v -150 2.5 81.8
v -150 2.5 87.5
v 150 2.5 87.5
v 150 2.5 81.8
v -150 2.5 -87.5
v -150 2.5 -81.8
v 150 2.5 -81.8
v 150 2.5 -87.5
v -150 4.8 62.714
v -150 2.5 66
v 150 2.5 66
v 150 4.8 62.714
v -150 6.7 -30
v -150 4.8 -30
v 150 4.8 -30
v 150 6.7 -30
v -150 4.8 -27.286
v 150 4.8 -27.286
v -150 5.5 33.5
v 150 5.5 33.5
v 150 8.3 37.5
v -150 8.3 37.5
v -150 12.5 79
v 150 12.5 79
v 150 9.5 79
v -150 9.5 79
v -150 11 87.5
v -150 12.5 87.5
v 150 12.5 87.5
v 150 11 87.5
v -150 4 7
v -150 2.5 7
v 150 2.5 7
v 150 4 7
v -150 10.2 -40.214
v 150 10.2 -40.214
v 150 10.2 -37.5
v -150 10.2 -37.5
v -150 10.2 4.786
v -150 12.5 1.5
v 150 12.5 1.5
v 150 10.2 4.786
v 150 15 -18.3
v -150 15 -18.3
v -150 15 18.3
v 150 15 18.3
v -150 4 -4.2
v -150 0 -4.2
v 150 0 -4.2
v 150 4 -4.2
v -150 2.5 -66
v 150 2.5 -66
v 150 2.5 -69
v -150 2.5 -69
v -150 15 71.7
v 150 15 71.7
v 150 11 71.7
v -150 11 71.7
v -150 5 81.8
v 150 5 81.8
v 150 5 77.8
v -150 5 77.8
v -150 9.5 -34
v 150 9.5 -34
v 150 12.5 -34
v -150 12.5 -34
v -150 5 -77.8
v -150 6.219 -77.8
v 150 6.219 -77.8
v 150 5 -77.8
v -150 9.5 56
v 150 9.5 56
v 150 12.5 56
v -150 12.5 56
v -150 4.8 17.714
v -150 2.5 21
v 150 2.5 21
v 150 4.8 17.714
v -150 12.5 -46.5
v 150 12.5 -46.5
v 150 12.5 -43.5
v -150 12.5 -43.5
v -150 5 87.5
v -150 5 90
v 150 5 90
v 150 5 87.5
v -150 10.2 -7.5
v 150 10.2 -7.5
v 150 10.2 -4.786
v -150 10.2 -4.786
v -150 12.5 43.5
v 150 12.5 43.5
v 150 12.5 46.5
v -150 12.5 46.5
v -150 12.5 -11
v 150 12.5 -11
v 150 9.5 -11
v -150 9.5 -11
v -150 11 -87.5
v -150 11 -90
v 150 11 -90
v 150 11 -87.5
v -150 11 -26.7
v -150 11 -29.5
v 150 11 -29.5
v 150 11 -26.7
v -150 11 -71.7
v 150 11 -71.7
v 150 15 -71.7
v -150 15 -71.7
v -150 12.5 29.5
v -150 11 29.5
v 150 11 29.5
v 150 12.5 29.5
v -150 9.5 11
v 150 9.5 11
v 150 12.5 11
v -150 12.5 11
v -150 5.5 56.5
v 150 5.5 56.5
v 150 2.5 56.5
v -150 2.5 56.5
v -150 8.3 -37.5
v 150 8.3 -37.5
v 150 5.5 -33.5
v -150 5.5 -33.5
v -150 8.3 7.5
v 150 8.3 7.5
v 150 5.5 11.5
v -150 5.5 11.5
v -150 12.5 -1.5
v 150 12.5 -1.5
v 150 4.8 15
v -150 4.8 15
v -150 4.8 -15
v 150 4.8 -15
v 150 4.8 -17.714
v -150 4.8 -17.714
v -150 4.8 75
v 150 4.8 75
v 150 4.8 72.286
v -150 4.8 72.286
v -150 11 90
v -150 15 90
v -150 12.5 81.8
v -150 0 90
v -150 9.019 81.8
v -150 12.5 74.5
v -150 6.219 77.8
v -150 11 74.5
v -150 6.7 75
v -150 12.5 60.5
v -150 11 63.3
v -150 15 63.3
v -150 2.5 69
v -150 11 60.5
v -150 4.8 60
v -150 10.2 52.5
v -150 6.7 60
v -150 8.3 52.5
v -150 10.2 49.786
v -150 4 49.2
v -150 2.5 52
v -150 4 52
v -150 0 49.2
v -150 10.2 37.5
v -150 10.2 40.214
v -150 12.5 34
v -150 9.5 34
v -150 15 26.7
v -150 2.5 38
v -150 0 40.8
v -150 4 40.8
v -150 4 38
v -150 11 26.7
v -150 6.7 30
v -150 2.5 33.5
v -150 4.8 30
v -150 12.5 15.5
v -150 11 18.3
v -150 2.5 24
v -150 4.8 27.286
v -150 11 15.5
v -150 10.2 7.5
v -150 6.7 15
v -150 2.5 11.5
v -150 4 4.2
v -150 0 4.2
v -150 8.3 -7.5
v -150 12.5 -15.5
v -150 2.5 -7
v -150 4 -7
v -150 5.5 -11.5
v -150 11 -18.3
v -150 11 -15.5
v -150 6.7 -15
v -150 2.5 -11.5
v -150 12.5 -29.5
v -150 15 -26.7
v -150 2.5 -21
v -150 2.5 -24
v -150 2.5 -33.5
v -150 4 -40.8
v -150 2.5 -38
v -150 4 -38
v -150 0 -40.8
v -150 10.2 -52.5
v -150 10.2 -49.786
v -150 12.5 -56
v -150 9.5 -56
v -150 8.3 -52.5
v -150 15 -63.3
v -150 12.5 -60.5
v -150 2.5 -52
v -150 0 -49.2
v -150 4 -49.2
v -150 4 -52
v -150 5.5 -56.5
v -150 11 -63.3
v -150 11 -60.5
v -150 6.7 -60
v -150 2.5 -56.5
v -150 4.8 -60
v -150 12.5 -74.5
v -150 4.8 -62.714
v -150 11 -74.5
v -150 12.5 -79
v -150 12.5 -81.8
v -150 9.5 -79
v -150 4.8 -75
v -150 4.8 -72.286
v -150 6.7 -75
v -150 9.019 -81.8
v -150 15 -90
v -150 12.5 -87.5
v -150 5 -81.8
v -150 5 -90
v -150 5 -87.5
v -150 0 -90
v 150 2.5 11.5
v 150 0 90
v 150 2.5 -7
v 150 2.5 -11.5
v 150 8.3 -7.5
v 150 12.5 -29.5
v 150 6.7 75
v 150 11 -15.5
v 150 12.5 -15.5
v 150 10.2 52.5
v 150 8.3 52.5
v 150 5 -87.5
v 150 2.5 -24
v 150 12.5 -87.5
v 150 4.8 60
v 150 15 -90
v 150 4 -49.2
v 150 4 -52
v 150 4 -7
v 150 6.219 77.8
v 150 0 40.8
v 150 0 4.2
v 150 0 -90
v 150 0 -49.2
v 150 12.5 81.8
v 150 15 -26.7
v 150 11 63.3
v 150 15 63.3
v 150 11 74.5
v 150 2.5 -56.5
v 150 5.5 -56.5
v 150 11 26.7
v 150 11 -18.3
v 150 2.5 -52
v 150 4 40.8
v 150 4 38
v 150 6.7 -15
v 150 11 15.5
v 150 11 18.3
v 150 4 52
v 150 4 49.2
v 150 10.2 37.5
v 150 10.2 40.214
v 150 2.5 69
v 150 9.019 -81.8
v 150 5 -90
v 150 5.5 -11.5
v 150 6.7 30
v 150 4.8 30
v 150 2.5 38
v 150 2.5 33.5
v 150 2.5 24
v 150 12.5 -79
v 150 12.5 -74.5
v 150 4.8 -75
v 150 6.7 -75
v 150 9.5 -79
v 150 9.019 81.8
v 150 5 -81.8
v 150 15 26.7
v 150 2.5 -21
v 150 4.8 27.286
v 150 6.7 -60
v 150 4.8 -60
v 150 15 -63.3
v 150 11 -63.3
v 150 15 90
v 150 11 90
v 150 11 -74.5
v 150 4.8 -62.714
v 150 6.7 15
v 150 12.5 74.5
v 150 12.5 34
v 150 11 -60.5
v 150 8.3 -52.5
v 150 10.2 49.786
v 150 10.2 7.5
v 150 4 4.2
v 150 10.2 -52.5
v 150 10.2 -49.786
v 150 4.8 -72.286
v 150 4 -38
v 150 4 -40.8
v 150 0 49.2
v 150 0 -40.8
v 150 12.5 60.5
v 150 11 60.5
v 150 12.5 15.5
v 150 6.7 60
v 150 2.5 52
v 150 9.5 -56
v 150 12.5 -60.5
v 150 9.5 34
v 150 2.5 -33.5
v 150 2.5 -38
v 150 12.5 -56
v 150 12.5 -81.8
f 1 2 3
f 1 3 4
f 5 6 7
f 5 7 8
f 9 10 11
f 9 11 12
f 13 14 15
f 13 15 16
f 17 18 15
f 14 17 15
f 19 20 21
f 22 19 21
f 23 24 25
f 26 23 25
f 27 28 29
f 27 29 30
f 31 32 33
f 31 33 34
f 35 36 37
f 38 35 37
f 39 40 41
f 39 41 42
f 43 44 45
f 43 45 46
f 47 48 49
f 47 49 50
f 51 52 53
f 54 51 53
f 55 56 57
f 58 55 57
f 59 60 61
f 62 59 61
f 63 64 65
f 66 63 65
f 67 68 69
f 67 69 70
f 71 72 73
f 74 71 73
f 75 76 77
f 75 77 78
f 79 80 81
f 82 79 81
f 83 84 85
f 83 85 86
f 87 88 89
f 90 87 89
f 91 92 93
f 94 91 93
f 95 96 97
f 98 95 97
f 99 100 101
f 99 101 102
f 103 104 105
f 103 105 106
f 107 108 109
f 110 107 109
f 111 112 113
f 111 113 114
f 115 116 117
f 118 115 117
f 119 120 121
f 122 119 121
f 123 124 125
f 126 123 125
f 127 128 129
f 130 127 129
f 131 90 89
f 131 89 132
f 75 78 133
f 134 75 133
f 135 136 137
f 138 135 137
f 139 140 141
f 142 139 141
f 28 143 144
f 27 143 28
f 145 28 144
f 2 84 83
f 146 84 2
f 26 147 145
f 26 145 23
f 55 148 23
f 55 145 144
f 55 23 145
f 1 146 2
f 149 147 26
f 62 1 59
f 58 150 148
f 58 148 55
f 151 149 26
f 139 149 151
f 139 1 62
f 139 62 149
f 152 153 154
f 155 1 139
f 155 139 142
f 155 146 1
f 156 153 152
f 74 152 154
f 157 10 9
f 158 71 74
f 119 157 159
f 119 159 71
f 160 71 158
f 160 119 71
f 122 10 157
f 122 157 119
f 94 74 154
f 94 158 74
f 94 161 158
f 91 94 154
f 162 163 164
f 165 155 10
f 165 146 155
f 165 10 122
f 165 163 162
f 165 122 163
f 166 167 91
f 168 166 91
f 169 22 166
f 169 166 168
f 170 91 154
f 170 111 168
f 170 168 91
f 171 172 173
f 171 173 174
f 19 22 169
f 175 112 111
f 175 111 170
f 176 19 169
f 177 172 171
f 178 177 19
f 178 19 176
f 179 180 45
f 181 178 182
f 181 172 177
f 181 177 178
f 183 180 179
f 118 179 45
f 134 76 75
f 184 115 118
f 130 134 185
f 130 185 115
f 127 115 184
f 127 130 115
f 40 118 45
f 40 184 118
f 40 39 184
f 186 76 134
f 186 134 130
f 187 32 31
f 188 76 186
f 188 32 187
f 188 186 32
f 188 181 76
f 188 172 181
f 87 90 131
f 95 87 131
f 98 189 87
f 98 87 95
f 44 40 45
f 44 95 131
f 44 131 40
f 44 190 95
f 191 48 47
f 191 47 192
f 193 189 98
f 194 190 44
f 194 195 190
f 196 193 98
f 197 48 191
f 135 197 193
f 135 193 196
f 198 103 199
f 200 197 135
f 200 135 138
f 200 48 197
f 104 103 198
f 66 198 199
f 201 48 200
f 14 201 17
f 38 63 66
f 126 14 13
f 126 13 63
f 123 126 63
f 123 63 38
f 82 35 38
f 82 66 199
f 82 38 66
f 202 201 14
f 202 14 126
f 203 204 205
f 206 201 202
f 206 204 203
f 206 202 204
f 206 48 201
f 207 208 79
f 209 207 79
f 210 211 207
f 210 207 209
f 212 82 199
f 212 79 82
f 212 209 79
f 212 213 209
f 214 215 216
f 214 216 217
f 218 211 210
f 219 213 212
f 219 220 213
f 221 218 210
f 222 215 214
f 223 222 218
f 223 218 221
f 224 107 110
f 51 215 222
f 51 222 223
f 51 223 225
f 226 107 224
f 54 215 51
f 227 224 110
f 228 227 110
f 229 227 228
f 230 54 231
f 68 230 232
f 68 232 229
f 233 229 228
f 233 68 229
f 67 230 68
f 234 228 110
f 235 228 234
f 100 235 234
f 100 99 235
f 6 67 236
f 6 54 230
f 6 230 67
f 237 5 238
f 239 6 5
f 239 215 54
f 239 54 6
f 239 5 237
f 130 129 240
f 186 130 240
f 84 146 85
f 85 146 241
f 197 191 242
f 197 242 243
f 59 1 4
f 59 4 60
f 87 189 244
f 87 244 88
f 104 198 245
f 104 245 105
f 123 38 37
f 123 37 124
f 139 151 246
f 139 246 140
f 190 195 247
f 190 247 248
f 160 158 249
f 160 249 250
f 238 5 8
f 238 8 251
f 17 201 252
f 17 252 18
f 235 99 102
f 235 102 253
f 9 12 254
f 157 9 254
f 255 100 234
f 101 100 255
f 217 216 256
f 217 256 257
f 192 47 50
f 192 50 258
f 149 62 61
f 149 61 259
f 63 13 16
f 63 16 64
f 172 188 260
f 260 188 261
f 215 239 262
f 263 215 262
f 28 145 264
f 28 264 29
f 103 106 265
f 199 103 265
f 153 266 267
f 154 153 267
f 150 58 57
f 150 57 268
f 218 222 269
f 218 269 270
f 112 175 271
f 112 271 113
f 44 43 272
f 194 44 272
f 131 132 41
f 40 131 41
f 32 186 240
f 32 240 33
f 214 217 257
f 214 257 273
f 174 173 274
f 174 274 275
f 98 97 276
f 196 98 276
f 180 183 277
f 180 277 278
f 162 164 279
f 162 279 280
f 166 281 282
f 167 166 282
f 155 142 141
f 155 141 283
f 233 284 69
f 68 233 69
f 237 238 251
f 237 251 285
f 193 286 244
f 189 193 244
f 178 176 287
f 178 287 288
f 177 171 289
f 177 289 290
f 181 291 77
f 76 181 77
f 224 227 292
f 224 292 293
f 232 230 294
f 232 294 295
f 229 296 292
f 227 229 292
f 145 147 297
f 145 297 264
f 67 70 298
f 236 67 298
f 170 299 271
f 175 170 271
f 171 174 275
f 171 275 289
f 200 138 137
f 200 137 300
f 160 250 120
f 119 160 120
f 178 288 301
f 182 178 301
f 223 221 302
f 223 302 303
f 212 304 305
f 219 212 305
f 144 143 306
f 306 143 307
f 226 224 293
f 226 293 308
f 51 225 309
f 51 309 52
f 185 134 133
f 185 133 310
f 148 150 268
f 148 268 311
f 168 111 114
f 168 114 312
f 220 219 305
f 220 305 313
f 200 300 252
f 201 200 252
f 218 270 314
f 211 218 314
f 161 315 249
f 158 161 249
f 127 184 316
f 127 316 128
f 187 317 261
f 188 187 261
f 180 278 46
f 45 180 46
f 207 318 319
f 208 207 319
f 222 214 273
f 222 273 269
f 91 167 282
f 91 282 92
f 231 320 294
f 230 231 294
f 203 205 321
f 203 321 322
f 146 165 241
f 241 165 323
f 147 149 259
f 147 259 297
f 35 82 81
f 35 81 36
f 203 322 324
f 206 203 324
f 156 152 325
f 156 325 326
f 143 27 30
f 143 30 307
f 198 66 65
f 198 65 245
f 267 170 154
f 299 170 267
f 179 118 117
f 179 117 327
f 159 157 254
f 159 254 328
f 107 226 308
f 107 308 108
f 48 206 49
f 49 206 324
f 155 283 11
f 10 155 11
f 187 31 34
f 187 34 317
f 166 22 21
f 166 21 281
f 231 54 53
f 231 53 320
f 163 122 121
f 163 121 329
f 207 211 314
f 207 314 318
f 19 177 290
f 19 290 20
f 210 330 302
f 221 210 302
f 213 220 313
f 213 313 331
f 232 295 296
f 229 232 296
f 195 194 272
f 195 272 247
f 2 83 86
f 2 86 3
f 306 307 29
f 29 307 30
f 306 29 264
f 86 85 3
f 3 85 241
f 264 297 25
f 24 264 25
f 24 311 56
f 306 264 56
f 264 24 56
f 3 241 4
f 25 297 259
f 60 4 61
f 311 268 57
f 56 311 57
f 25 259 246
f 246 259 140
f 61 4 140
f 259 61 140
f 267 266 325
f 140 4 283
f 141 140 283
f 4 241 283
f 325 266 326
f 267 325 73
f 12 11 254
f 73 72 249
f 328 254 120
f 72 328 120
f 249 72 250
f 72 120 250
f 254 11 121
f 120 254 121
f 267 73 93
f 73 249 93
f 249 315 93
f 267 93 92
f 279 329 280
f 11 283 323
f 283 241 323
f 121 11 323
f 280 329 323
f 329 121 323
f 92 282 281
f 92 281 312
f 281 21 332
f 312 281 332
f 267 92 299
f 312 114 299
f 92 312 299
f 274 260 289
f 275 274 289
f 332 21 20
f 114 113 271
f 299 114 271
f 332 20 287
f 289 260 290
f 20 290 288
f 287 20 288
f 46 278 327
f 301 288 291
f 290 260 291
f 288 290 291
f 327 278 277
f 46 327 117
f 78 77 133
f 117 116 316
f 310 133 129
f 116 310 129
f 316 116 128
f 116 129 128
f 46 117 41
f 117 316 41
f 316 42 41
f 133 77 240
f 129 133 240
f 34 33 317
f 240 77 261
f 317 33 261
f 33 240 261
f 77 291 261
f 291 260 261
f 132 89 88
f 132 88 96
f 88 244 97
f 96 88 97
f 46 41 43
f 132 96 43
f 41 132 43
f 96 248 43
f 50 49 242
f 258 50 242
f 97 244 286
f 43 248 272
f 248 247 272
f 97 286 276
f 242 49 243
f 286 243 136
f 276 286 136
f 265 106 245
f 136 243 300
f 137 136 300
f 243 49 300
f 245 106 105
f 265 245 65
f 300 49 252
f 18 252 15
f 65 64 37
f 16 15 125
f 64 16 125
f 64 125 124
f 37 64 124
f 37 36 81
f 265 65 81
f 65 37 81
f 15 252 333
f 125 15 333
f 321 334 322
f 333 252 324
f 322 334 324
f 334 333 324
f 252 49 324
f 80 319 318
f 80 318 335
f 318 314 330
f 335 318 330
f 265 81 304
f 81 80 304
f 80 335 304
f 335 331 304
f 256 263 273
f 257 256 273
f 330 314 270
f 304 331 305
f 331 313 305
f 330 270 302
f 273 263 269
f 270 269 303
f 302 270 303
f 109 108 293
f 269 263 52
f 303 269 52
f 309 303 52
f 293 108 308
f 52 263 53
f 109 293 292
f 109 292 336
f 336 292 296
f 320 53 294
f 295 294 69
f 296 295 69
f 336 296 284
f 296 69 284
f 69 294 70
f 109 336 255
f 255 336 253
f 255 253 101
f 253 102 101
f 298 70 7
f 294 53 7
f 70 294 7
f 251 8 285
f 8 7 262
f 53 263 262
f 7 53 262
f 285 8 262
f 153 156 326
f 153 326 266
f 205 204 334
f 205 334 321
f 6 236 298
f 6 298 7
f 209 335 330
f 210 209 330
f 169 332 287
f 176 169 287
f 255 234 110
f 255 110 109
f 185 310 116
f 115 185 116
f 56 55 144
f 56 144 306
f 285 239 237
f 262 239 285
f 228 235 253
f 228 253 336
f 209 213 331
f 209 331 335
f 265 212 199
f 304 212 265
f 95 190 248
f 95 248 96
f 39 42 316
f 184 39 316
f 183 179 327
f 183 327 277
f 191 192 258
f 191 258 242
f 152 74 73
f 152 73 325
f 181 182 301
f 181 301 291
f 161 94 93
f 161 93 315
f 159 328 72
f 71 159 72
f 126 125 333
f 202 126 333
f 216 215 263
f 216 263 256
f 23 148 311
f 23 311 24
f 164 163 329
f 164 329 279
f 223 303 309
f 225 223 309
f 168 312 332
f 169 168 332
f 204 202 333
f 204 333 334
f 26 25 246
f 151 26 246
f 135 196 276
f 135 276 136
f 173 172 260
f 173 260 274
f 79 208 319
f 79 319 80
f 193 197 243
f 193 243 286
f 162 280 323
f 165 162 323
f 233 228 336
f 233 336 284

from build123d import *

# Parameters (mm, degrees)
SKETCH_1_W               = 300
SKETCH_1_H               = 180
EXTRUDE_1_DEPTH          = 15
CUT_EXTRUDE_1_DEPTH      = 176.570498661
CUT_EXTRUDE_1_DEPTH_BACK = 176.570498661
CUT_EXTRUDE_2_DEPTH      = 176.570498661
CUT_EXTRUDE_2_DEPTH_BACK = 176.570498661
CUT_EXTRUDE_3_DEPTH      = 176.570498661
CUT_EXTRUDE_3_DEPTH_BACK = 176.570498661


with BuildPart() as part:
    # Эскиз1 → Бобышка-Вытянуть1 (new body)
    with BuildSketch(Plane(origin=(0, 0, 0), x_dir=(1, 0, 0), z_dir=(0, 1, 0))):
        Rectangle(SKETCH_1_W, SKETCH_1_H)
    extrude(amount=EXTRUDE_1_DEPTH)

    # Эскиз3 → Вырез-Вытянуть1 (cut, two sides: drawn at the far end of the back side and taken through both)
    with BuildSketch(Plane(origin=(0, 0, 0), x_dir=(0, 0, -1), z_dir=(1, 0, 0)).offset(-CUT_EXTRUDE_1_DEPTH_BACK)):
        Polygon((-49.2, 0), (-40.8, 0), (-40.8, 4), (-38, 4), (-38, 2.5), (-33.5, 2.5), (-33.5, 5.5), (-37.5, 8.3), (-37.5, 10.2), (-40.214285714, 10.2), (-43.5, 12.5), (-46.5, 12.5), (-49.785714286, 10.2), (-52.5, 10.2), (-52.5, 8.3), (-56.5, 5.5), (-56.5, 2.5), (-52, 2.5), (-52, 4), (-49.2, 4), align=None)
        Polygon((-4.2, 0), (4.2, 0), (4.2, 4), (7, 4), (7, 2.5), (11.5, 2.5), (11.5, 5.5), (7.5, 8.3), (7.5, 10.2), (4.785714286, 10.2), (1.5, 12.5), (-1.5, 12.5), (-4.785714286, 10.2), (-7.5, 10.2), (-7.5, 8.3), (-11.5, 5.5), (-11.5, 2.5), (-7, 2.5), (-7, 4), (-4.2, 4), align=None)
        Polygon((40.8, 4), (40.8, 0), (49.2, 0), (49.2, 4), (52, 4), (52, 2.5), (56.5, 2.5), (56.5, 5.5), (52.5, 8.3), (52.5, 10.2), (49.785714286, 10.2), (46.5, 12.5), (43.5, 12.5), (40.214285714, 10.2), (37.5, 10.2), (37.5, 8.3), (33.5, 5.5), (33.5, 2.5), (38, 2.5), (38, 4), align=None)
    extrude(amount=CUT_EXTRUDE_1_DEPTH + CUT_EXTRUDE_1_DEPTH_BACK, mode=Mode.SUBTRACT)

    # Эскиз4 → Вырез-Вытянуть2 (cut, two sides: drawn at the far end of the back side and taken through both)
    with BuildSketch(Plane(origin=(0, 0, 0), x_dir=(0, 0, -1), z_dir=(1, 0, 0)).offset(-CUT_EXTRUDE_2_DEPTH_BACK)):
        Polygon((-71.7, 15), (-71.7, 11), (-74.5, 11), (-74.5, 12.5), (-79, 12.5), (-79, 9.5), (-75, 6.7), (-75, 4.8), (-72.285714286, 4.8), (-69, 2.5), (-66, 2.5), (-62.714285714, 4.8), (-60, 4.8), (-60, 6.7), (-56, 9.5), (-56, 12.5), (-60.5, 12.5), (-60.5, 11), (-63.3, 11), (-63.3, 15), align=None)
        Polygon((-18.3, 15), (-26.7, 15), (-26.7, 11), (-29.5, 11), (-29.5, 12.5), (-34, 12.5), (-34, 9.5), (-30, 6.7), (-30, 4.8), (-27.285714286, 4.8), (-24, 2.5), (-21, 2.5), (-17.714285714, 4.8), (-15, 4.8), (-15, 6.7), (-11, 9.5), (-11, 12.5), (-15.5, 12.5), (-15.5, 11), (-18.3, 11), align=None)
        Polygon((26.7, 15), (18.3, 15), (18.3, 11), (15.5, 11), (15.5, 12.5), (11, 12.5), (11, 9.5), (15, 6.7), (15, 4.8), (17.714285714, 4.8), (21, 2.5), (24, 2.5), (27.285714286, 4.8), (30, 4.8), (30, 6.7), (34, 9.5), (34, 12.5), (29.5, 12.5), (29.5, 11), (26.7, 11), align=None)
        Polygon((71.7, 15), (63.3, 15), (63.3, 11), (60.5, 11), (60.5, 12.5), (56, 12.5), (56, 9.5), (60, 6.7), (60, 4.8), (62.714285714, 4.8), (66, 2.5), (69, 2.5), (72.285714286, 4.8), (75, 4.8), (75, 6.7), (79, 9.5), (79, 12.5), (74.5, 12.5), (74.5, 11), (71.7, 11), align=None)
    extrude(amount=CUT_EXTRUDE_2_DEPTH + CUT_EXTRUDE_2_DEPTH_BACK, mode=Mode.SUBTRACT)

    # Эскиз5 → Вырез-Вытянуть3 (cut, two sides: drawn at the far end of the back side and taken through both)
    with BuildSketch(Plane(origin=(0, 0, 0), x_dir=(0, 0, -1), z_dir=(1, 0, 0)).offset(-CUT_EXTRUDE_3_DEPTH_BACK)):
        Polygon((-90, 11), (-90, 5), (-87.5, 5), (-87.5, 2.5), (-81.8, 2.5), (-81.8, 5), (-77.8, 5), (-77.8, 6.218688877), (-81.8, 9.018688877), (-81.8, 12.5), (-87.5, 12.5), (-87.5, 11), align=None)
        Polygon((90, 5), (90, 11), (87.5, 11), (87.5, 12.5), (81.8, 12.5), (81.8, 9.018688877), (77.8, 6.218688877), (77.8, 5), (81.8, 5), (81.8, 2.5), (87.5, 2.5), (87.5, 5), align=None)
    extrude(amount=CUT_EXTRUDE_3_DEPTH + CUT_EXTRUDE_3_DEPTH_BACK, mode=Mode.SUBTRACT)


solid = part.part
